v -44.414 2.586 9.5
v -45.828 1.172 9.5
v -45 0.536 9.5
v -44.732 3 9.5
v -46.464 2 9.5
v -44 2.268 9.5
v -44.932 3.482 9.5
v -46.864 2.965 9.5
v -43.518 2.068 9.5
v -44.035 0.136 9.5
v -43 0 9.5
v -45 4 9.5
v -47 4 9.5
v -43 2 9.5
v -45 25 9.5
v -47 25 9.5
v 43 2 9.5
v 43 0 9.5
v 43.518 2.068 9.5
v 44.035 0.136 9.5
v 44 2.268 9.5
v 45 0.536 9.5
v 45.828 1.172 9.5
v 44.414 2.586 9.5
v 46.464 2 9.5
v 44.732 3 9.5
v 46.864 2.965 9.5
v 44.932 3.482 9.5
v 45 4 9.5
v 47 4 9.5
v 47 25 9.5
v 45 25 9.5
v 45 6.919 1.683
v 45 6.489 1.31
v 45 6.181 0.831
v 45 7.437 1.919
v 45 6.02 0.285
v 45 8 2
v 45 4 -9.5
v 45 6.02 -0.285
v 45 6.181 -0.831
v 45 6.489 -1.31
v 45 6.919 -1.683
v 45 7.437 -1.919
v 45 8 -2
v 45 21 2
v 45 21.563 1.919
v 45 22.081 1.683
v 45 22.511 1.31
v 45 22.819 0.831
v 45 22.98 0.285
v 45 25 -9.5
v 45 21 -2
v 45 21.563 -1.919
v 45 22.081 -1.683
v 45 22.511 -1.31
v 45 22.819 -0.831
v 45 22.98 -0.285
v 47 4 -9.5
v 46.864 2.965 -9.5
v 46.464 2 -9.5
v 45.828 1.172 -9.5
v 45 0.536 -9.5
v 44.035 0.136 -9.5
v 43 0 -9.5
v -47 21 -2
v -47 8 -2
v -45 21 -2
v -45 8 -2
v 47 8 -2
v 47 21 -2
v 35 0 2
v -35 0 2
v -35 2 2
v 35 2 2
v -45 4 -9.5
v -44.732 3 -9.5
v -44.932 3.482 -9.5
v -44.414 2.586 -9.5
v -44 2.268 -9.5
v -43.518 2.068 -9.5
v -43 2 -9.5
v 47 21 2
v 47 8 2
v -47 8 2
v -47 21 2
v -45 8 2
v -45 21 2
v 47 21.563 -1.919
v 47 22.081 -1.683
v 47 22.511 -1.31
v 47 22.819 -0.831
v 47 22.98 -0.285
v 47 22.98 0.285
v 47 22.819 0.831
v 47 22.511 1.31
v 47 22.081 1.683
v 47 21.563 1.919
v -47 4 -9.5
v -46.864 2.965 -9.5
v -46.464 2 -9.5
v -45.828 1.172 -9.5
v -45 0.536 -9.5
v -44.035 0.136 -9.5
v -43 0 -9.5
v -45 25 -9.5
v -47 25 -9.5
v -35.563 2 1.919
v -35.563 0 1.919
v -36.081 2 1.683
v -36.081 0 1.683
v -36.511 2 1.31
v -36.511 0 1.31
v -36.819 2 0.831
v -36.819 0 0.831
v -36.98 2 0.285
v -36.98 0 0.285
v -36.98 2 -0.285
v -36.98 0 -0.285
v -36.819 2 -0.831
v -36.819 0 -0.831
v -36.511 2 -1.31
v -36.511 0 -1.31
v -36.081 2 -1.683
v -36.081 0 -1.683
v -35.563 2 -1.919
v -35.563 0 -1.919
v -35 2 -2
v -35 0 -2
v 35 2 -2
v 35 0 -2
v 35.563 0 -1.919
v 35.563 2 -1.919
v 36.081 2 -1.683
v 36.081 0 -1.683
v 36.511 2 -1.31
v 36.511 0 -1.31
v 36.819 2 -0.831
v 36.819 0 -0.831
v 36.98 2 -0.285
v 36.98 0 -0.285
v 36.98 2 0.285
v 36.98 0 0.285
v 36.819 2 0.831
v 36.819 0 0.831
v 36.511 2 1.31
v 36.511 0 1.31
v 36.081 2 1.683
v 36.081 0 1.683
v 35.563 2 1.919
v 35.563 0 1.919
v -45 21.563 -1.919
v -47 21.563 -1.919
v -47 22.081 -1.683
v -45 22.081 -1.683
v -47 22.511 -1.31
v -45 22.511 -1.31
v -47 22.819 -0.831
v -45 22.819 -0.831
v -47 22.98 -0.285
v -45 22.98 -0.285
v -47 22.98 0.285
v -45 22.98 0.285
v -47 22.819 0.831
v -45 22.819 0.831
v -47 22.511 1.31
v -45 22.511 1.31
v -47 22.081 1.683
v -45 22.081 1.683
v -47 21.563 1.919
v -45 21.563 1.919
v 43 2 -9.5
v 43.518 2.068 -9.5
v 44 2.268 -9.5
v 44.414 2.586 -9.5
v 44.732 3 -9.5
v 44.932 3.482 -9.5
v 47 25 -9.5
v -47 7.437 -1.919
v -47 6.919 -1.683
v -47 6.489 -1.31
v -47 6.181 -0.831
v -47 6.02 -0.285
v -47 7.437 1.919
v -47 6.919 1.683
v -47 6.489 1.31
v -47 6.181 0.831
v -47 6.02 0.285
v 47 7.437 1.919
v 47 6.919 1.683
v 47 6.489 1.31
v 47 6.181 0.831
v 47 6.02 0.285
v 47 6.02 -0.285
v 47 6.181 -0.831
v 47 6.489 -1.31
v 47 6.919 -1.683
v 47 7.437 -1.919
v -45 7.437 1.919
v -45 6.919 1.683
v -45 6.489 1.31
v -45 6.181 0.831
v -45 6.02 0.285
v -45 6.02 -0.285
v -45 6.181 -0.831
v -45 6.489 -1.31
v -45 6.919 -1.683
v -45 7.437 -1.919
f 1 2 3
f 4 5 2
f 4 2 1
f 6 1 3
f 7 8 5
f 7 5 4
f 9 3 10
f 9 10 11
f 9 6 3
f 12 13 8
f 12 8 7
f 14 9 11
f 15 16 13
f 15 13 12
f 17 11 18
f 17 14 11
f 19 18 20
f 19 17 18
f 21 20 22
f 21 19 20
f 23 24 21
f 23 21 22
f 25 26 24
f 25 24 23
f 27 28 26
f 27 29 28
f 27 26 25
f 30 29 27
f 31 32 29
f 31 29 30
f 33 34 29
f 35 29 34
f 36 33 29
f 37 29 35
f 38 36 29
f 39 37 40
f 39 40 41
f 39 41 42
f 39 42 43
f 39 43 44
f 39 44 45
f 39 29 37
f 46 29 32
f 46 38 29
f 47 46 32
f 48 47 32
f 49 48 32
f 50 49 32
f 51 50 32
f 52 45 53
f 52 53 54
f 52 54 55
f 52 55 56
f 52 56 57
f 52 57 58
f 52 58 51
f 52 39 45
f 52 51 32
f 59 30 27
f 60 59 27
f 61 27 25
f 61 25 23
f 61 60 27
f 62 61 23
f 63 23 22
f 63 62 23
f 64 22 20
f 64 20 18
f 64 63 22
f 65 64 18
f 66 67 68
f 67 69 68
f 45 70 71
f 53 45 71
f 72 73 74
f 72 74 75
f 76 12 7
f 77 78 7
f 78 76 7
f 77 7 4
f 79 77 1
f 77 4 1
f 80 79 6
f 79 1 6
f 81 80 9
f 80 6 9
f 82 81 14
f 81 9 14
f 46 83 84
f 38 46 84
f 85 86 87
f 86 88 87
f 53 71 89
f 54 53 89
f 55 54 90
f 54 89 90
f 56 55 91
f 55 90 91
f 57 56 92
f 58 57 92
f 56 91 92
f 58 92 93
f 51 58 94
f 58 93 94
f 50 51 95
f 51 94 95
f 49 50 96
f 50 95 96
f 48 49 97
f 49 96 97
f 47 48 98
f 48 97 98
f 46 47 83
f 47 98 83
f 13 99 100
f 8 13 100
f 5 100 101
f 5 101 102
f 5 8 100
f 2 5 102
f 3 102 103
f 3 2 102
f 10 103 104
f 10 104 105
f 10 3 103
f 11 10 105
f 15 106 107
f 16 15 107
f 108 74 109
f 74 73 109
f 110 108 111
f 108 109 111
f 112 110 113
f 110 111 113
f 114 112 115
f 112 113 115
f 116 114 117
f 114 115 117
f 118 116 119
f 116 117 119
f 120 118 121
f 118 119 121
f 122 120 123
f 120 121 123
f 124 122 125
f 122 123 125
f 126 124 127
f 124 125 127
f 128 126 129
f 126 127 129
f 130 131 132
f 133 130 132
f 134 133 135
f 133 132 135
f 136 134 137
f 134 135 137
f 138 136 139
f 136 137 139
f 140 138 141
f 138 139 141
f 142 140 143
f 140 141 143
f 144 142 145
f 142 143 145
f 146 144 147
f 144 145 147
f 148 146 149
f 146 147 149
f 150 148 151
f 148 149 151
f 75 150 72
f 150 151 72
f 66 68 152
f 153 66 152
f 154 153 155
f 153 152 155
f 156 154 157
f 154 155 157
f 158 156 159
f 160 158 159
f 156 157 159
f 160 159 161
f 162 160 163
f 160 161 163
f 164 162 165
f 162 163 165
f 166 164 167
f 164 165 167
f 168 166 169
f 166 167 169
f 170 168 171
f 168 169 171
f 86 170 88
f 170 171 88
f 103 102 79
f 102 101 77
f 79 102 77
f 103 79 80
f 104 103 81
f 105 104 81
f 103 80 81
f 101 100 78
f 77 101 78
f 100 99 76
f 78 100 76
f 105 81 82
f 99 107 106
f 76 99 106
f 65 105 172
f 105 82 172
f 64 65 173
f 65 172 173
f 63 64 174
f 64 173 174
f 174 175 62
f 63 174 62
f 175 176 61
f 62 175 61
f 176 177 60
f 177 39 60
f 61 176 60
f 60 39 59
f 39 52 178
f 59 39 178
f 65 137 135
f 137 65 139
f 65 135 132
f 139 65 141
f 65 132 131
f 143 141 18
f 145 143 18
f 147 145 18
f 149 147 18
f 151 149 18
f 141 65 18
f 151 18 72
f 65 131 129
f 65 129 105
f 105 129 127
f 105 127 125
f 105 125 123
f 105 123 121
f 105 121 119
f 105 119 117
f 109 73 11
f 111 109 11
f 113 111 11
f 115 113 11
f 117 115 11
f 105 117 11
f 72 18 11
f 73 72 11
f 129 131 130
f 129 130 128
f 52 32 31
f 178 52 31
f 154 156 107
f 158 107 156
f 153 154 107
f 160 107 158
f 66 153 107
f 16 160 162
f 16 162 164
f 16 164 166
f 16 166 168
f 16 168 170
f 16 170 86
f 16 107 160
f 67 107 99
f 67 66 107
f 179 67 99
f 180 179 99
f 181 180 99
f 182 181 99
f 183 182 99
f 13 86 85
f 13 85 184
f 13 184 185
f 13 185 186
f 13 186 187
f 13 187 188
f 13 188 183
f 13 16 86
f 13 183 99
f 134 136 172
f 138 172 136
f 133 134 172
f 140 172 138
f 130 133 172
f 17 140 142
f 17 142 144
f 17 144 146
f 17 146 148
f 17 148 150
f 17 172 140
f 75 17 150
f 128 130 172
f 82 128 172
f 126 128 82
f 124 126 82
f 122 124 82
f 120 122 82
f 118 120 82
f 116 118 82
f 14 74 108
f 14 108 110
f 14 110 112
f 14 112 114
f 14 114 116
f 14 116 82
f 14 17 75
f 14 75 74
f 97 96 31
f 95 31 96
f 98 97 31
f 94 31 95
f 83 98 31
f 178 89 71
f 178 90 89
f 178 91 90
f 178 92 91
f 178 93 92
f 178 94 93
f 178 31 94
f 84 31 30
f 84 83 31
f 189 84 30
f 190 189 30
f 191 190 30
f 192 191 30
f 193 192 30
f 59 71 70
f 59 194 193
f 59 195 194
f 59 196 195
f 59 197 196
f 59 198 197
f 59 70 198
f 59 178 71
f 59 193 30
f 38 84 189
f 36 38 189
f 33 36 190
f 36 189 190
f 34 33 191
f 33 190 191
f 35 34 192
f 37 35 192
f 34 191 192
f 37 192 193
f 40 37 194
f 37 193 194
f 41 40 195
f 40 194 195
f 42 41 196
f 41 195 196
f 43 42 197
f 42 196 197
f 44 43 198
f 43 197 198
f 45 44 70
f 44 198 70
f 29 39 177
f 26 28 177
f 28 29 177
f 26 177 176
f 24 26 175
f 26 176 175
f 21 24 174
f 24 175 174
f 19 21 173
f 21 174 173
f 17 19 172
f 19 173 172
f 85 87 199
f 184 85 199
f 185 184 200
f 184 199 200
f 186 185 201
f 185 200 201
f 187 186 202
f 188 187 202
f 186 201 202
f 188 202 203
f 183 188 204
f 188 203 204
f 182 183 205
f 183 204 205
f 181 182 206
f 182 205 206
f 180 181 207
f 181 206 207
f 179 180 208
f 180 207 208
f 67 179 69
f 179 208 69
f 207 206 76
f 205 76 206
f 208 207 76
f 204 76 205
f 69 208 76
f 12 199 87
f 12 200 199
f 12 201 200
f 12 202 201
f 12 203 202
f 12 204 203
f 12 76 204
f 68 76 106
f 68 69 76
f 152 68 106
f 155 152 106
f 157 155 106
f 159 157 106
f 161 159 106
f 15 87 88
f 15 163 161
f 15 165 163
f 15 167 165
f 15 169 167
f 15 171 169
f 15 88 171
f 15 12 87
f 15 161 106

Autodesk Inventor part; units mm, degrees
ref_plane "YZ Plane" through (0, 0, 0) normal (1, 0, 0) x (0, 1, 0)
ref_plane "XZ Plane" through (0, 0, 0) normal (0, 1, 0) x (-1, 0, 0)
ref_plane "XY Plane" through (0, 0, 0) normal (0, 0, 1) x (1, 0, 0)
sketch "スケッチ1" plane through (0, 0, 0) normal (0, 1, 0) x (-1, 0, 0)
  line L0 (-47, -9.5) -> (47, -9.5)
  line L1 (47, -9.5) -> (47, 9.5)
  line L2 (47, 9.5) -> (-47, 9.5)
  line L3 (-47, 9.5) -> (-47, -9.5)
  line L4 (-47, -9.5) -> (47, 9.5) construction
  line L5 (47, -9.5) -> (-47, 9.5) construction
  point P0 (0, 0)
  dimension "d0" = 94
  dimension "d1" = 19
extrude "プレート1" add sketch "スケッチ1" along normal blind 2
sketch "スケッチ2" plane through (45, 0, -9.5) normal (1, 0, 0) x (0, 1, 0)
  line L0 (0, 19) -> (0, 0)
  line L1 (0, 0) -> (25, 0)
  line L2 (25, 0) -> (25, 19)
  line L3 (25, 19) -> (0, 19)
edge flange "フランジ1" height 25 angle 90 thickness 2 bend radius 2 thickness toward (1, 0, 0) relief tear relief width 2 relief depth 1 edges at (47, 2, 0) wall of the first edge with corners at (45, 0, 9.5) (45, 0, -9.5) (45, 25, -9.5) (45, 25, 9.5)
bend "曲げ1"
corner "コーナー1"
sketch "スケッチ3" plane through (-45, 0, 9.5) normal (-1, 0, 0) x (0, -1, 0)
  line L0 (0, -19) -> (0, 0)
  line L1 (0, 0) -> (-25, 0)
  line L2 (-25, 0) -> (-25, -19)
  line L3 (-25, -19) -> (0, -19)
edge flange "フランジ2" height 25 angle 90 thickness 2 bend radius 2 thickness toward (-1, 0, 0) relief tear relief width 2 relief depth 1 edges at (-47, 2, 0) wall of the first edge with corners at (-45, 0, -9.5) (-45, 0, 9.5) (-45, 25, 9.5) (-45, 25, -9.5)
bend "曲げ2"
corner "コーナー2"
sketch "スケッチ5" plane through (0, 0, 0) normal (0, -1, 0) x (1, 0, 0)
  arc A0 (-35, 2) -> (-35, -2) centre (-35, 0) ccw
  arc A1 (35, -2) -> (35, 2) centre (35, 0) ccw
  line L0 (-35, 2) -> (35, 2)
  line L1 (35, -2) -> (-35, -2)
  point P0 (0, 0)
  dimension "d31" = 4
  dimension "d32" = 2
  dimension "d33" = 2
  dimension "d34" = 2
  dimension "d35" = 35
  dimension "d36" = 35
extrude "押し出し1" cut sketch "スケッチ5" against normal blind 2
sketch "スケッチ6" plane through (47, 25, 9.5) normal (1, 0, 0) x (0, 0, -1)
  point P0 (9.5, -25)
sketch "スケッチ7" plane through (47, 25, 9.5) normal (1, 0, 0) x (0, 0, -1)
  line L0 (7.5, -4) -> (7.5, -17)
  arc A0 (7.5, -17) -> (11.5, -17) centre (9.5, -17) ccw
  line L1 (11.5, -17) -> (11.5, -4)
  arc A1 (11.5, -4) -> (7.5, -4) centre (9.5, -4) ccw
  line L2 (0, 0) -> (19, 0) projected
  line L3 (0, -21) -> (19, -21) projected
  point P0 (9.5, -25)
  point P1 (9.5, 0)
  dimension "d45" = 4
  dimension "d46" = 4
  dimension "d47" = 2
extrude "押し出し2" cut sketch "スケッチ7" against normal blind 100
equation "\"d2\" = Thickness"
equation "\"d3\" = BendReliefWidth"
equation "\"d4\" = BendReliefDepth"
equation "\"d5\" = MinimumRemnant"
equation "\"d6\" = TransitionRadius"
equation "\"d9\" = BendRadius"
equation "\"d10\" = CornerReliefSize"
equation "\"d11\" = GapSize"
equation "\"d12\" = JacobiRadiusSize"
equation "\"d13\" = BendReliefWidth"
equation "\"d14\" = BendReliefDepth"
equation "\"d15\" = MinimumRemnant"
equation "\"d16\" = TransitionRadius"
equation "\"d19\" = BendRadius"
equation "\"d20\" = CornerReliefSize"
equation "\"d21\" = GapSize"
equation "\"d22\" = JacobiRadiusSize"
equation "\"BendRadius\" = Thickness"
equation "\"BendReliefWidth\" = Thickness"
equation "\"BendReliefDepth\" = 0.5 * Thickness"
equation "\"CornerReliefSize\" = 4 * Thickness"
equation "\"MinimumRemnant\" = 2 * Thickness"
equation "\"TransitionRadius\" = BendRadius"
equation "\"JacobiRadiusSize\" = BendRadius"
equation "\"GapSize\" = Thickness"
equation "\"Thickness\" = 2"
properties part number "cup" material "アルミニウム 6061"
